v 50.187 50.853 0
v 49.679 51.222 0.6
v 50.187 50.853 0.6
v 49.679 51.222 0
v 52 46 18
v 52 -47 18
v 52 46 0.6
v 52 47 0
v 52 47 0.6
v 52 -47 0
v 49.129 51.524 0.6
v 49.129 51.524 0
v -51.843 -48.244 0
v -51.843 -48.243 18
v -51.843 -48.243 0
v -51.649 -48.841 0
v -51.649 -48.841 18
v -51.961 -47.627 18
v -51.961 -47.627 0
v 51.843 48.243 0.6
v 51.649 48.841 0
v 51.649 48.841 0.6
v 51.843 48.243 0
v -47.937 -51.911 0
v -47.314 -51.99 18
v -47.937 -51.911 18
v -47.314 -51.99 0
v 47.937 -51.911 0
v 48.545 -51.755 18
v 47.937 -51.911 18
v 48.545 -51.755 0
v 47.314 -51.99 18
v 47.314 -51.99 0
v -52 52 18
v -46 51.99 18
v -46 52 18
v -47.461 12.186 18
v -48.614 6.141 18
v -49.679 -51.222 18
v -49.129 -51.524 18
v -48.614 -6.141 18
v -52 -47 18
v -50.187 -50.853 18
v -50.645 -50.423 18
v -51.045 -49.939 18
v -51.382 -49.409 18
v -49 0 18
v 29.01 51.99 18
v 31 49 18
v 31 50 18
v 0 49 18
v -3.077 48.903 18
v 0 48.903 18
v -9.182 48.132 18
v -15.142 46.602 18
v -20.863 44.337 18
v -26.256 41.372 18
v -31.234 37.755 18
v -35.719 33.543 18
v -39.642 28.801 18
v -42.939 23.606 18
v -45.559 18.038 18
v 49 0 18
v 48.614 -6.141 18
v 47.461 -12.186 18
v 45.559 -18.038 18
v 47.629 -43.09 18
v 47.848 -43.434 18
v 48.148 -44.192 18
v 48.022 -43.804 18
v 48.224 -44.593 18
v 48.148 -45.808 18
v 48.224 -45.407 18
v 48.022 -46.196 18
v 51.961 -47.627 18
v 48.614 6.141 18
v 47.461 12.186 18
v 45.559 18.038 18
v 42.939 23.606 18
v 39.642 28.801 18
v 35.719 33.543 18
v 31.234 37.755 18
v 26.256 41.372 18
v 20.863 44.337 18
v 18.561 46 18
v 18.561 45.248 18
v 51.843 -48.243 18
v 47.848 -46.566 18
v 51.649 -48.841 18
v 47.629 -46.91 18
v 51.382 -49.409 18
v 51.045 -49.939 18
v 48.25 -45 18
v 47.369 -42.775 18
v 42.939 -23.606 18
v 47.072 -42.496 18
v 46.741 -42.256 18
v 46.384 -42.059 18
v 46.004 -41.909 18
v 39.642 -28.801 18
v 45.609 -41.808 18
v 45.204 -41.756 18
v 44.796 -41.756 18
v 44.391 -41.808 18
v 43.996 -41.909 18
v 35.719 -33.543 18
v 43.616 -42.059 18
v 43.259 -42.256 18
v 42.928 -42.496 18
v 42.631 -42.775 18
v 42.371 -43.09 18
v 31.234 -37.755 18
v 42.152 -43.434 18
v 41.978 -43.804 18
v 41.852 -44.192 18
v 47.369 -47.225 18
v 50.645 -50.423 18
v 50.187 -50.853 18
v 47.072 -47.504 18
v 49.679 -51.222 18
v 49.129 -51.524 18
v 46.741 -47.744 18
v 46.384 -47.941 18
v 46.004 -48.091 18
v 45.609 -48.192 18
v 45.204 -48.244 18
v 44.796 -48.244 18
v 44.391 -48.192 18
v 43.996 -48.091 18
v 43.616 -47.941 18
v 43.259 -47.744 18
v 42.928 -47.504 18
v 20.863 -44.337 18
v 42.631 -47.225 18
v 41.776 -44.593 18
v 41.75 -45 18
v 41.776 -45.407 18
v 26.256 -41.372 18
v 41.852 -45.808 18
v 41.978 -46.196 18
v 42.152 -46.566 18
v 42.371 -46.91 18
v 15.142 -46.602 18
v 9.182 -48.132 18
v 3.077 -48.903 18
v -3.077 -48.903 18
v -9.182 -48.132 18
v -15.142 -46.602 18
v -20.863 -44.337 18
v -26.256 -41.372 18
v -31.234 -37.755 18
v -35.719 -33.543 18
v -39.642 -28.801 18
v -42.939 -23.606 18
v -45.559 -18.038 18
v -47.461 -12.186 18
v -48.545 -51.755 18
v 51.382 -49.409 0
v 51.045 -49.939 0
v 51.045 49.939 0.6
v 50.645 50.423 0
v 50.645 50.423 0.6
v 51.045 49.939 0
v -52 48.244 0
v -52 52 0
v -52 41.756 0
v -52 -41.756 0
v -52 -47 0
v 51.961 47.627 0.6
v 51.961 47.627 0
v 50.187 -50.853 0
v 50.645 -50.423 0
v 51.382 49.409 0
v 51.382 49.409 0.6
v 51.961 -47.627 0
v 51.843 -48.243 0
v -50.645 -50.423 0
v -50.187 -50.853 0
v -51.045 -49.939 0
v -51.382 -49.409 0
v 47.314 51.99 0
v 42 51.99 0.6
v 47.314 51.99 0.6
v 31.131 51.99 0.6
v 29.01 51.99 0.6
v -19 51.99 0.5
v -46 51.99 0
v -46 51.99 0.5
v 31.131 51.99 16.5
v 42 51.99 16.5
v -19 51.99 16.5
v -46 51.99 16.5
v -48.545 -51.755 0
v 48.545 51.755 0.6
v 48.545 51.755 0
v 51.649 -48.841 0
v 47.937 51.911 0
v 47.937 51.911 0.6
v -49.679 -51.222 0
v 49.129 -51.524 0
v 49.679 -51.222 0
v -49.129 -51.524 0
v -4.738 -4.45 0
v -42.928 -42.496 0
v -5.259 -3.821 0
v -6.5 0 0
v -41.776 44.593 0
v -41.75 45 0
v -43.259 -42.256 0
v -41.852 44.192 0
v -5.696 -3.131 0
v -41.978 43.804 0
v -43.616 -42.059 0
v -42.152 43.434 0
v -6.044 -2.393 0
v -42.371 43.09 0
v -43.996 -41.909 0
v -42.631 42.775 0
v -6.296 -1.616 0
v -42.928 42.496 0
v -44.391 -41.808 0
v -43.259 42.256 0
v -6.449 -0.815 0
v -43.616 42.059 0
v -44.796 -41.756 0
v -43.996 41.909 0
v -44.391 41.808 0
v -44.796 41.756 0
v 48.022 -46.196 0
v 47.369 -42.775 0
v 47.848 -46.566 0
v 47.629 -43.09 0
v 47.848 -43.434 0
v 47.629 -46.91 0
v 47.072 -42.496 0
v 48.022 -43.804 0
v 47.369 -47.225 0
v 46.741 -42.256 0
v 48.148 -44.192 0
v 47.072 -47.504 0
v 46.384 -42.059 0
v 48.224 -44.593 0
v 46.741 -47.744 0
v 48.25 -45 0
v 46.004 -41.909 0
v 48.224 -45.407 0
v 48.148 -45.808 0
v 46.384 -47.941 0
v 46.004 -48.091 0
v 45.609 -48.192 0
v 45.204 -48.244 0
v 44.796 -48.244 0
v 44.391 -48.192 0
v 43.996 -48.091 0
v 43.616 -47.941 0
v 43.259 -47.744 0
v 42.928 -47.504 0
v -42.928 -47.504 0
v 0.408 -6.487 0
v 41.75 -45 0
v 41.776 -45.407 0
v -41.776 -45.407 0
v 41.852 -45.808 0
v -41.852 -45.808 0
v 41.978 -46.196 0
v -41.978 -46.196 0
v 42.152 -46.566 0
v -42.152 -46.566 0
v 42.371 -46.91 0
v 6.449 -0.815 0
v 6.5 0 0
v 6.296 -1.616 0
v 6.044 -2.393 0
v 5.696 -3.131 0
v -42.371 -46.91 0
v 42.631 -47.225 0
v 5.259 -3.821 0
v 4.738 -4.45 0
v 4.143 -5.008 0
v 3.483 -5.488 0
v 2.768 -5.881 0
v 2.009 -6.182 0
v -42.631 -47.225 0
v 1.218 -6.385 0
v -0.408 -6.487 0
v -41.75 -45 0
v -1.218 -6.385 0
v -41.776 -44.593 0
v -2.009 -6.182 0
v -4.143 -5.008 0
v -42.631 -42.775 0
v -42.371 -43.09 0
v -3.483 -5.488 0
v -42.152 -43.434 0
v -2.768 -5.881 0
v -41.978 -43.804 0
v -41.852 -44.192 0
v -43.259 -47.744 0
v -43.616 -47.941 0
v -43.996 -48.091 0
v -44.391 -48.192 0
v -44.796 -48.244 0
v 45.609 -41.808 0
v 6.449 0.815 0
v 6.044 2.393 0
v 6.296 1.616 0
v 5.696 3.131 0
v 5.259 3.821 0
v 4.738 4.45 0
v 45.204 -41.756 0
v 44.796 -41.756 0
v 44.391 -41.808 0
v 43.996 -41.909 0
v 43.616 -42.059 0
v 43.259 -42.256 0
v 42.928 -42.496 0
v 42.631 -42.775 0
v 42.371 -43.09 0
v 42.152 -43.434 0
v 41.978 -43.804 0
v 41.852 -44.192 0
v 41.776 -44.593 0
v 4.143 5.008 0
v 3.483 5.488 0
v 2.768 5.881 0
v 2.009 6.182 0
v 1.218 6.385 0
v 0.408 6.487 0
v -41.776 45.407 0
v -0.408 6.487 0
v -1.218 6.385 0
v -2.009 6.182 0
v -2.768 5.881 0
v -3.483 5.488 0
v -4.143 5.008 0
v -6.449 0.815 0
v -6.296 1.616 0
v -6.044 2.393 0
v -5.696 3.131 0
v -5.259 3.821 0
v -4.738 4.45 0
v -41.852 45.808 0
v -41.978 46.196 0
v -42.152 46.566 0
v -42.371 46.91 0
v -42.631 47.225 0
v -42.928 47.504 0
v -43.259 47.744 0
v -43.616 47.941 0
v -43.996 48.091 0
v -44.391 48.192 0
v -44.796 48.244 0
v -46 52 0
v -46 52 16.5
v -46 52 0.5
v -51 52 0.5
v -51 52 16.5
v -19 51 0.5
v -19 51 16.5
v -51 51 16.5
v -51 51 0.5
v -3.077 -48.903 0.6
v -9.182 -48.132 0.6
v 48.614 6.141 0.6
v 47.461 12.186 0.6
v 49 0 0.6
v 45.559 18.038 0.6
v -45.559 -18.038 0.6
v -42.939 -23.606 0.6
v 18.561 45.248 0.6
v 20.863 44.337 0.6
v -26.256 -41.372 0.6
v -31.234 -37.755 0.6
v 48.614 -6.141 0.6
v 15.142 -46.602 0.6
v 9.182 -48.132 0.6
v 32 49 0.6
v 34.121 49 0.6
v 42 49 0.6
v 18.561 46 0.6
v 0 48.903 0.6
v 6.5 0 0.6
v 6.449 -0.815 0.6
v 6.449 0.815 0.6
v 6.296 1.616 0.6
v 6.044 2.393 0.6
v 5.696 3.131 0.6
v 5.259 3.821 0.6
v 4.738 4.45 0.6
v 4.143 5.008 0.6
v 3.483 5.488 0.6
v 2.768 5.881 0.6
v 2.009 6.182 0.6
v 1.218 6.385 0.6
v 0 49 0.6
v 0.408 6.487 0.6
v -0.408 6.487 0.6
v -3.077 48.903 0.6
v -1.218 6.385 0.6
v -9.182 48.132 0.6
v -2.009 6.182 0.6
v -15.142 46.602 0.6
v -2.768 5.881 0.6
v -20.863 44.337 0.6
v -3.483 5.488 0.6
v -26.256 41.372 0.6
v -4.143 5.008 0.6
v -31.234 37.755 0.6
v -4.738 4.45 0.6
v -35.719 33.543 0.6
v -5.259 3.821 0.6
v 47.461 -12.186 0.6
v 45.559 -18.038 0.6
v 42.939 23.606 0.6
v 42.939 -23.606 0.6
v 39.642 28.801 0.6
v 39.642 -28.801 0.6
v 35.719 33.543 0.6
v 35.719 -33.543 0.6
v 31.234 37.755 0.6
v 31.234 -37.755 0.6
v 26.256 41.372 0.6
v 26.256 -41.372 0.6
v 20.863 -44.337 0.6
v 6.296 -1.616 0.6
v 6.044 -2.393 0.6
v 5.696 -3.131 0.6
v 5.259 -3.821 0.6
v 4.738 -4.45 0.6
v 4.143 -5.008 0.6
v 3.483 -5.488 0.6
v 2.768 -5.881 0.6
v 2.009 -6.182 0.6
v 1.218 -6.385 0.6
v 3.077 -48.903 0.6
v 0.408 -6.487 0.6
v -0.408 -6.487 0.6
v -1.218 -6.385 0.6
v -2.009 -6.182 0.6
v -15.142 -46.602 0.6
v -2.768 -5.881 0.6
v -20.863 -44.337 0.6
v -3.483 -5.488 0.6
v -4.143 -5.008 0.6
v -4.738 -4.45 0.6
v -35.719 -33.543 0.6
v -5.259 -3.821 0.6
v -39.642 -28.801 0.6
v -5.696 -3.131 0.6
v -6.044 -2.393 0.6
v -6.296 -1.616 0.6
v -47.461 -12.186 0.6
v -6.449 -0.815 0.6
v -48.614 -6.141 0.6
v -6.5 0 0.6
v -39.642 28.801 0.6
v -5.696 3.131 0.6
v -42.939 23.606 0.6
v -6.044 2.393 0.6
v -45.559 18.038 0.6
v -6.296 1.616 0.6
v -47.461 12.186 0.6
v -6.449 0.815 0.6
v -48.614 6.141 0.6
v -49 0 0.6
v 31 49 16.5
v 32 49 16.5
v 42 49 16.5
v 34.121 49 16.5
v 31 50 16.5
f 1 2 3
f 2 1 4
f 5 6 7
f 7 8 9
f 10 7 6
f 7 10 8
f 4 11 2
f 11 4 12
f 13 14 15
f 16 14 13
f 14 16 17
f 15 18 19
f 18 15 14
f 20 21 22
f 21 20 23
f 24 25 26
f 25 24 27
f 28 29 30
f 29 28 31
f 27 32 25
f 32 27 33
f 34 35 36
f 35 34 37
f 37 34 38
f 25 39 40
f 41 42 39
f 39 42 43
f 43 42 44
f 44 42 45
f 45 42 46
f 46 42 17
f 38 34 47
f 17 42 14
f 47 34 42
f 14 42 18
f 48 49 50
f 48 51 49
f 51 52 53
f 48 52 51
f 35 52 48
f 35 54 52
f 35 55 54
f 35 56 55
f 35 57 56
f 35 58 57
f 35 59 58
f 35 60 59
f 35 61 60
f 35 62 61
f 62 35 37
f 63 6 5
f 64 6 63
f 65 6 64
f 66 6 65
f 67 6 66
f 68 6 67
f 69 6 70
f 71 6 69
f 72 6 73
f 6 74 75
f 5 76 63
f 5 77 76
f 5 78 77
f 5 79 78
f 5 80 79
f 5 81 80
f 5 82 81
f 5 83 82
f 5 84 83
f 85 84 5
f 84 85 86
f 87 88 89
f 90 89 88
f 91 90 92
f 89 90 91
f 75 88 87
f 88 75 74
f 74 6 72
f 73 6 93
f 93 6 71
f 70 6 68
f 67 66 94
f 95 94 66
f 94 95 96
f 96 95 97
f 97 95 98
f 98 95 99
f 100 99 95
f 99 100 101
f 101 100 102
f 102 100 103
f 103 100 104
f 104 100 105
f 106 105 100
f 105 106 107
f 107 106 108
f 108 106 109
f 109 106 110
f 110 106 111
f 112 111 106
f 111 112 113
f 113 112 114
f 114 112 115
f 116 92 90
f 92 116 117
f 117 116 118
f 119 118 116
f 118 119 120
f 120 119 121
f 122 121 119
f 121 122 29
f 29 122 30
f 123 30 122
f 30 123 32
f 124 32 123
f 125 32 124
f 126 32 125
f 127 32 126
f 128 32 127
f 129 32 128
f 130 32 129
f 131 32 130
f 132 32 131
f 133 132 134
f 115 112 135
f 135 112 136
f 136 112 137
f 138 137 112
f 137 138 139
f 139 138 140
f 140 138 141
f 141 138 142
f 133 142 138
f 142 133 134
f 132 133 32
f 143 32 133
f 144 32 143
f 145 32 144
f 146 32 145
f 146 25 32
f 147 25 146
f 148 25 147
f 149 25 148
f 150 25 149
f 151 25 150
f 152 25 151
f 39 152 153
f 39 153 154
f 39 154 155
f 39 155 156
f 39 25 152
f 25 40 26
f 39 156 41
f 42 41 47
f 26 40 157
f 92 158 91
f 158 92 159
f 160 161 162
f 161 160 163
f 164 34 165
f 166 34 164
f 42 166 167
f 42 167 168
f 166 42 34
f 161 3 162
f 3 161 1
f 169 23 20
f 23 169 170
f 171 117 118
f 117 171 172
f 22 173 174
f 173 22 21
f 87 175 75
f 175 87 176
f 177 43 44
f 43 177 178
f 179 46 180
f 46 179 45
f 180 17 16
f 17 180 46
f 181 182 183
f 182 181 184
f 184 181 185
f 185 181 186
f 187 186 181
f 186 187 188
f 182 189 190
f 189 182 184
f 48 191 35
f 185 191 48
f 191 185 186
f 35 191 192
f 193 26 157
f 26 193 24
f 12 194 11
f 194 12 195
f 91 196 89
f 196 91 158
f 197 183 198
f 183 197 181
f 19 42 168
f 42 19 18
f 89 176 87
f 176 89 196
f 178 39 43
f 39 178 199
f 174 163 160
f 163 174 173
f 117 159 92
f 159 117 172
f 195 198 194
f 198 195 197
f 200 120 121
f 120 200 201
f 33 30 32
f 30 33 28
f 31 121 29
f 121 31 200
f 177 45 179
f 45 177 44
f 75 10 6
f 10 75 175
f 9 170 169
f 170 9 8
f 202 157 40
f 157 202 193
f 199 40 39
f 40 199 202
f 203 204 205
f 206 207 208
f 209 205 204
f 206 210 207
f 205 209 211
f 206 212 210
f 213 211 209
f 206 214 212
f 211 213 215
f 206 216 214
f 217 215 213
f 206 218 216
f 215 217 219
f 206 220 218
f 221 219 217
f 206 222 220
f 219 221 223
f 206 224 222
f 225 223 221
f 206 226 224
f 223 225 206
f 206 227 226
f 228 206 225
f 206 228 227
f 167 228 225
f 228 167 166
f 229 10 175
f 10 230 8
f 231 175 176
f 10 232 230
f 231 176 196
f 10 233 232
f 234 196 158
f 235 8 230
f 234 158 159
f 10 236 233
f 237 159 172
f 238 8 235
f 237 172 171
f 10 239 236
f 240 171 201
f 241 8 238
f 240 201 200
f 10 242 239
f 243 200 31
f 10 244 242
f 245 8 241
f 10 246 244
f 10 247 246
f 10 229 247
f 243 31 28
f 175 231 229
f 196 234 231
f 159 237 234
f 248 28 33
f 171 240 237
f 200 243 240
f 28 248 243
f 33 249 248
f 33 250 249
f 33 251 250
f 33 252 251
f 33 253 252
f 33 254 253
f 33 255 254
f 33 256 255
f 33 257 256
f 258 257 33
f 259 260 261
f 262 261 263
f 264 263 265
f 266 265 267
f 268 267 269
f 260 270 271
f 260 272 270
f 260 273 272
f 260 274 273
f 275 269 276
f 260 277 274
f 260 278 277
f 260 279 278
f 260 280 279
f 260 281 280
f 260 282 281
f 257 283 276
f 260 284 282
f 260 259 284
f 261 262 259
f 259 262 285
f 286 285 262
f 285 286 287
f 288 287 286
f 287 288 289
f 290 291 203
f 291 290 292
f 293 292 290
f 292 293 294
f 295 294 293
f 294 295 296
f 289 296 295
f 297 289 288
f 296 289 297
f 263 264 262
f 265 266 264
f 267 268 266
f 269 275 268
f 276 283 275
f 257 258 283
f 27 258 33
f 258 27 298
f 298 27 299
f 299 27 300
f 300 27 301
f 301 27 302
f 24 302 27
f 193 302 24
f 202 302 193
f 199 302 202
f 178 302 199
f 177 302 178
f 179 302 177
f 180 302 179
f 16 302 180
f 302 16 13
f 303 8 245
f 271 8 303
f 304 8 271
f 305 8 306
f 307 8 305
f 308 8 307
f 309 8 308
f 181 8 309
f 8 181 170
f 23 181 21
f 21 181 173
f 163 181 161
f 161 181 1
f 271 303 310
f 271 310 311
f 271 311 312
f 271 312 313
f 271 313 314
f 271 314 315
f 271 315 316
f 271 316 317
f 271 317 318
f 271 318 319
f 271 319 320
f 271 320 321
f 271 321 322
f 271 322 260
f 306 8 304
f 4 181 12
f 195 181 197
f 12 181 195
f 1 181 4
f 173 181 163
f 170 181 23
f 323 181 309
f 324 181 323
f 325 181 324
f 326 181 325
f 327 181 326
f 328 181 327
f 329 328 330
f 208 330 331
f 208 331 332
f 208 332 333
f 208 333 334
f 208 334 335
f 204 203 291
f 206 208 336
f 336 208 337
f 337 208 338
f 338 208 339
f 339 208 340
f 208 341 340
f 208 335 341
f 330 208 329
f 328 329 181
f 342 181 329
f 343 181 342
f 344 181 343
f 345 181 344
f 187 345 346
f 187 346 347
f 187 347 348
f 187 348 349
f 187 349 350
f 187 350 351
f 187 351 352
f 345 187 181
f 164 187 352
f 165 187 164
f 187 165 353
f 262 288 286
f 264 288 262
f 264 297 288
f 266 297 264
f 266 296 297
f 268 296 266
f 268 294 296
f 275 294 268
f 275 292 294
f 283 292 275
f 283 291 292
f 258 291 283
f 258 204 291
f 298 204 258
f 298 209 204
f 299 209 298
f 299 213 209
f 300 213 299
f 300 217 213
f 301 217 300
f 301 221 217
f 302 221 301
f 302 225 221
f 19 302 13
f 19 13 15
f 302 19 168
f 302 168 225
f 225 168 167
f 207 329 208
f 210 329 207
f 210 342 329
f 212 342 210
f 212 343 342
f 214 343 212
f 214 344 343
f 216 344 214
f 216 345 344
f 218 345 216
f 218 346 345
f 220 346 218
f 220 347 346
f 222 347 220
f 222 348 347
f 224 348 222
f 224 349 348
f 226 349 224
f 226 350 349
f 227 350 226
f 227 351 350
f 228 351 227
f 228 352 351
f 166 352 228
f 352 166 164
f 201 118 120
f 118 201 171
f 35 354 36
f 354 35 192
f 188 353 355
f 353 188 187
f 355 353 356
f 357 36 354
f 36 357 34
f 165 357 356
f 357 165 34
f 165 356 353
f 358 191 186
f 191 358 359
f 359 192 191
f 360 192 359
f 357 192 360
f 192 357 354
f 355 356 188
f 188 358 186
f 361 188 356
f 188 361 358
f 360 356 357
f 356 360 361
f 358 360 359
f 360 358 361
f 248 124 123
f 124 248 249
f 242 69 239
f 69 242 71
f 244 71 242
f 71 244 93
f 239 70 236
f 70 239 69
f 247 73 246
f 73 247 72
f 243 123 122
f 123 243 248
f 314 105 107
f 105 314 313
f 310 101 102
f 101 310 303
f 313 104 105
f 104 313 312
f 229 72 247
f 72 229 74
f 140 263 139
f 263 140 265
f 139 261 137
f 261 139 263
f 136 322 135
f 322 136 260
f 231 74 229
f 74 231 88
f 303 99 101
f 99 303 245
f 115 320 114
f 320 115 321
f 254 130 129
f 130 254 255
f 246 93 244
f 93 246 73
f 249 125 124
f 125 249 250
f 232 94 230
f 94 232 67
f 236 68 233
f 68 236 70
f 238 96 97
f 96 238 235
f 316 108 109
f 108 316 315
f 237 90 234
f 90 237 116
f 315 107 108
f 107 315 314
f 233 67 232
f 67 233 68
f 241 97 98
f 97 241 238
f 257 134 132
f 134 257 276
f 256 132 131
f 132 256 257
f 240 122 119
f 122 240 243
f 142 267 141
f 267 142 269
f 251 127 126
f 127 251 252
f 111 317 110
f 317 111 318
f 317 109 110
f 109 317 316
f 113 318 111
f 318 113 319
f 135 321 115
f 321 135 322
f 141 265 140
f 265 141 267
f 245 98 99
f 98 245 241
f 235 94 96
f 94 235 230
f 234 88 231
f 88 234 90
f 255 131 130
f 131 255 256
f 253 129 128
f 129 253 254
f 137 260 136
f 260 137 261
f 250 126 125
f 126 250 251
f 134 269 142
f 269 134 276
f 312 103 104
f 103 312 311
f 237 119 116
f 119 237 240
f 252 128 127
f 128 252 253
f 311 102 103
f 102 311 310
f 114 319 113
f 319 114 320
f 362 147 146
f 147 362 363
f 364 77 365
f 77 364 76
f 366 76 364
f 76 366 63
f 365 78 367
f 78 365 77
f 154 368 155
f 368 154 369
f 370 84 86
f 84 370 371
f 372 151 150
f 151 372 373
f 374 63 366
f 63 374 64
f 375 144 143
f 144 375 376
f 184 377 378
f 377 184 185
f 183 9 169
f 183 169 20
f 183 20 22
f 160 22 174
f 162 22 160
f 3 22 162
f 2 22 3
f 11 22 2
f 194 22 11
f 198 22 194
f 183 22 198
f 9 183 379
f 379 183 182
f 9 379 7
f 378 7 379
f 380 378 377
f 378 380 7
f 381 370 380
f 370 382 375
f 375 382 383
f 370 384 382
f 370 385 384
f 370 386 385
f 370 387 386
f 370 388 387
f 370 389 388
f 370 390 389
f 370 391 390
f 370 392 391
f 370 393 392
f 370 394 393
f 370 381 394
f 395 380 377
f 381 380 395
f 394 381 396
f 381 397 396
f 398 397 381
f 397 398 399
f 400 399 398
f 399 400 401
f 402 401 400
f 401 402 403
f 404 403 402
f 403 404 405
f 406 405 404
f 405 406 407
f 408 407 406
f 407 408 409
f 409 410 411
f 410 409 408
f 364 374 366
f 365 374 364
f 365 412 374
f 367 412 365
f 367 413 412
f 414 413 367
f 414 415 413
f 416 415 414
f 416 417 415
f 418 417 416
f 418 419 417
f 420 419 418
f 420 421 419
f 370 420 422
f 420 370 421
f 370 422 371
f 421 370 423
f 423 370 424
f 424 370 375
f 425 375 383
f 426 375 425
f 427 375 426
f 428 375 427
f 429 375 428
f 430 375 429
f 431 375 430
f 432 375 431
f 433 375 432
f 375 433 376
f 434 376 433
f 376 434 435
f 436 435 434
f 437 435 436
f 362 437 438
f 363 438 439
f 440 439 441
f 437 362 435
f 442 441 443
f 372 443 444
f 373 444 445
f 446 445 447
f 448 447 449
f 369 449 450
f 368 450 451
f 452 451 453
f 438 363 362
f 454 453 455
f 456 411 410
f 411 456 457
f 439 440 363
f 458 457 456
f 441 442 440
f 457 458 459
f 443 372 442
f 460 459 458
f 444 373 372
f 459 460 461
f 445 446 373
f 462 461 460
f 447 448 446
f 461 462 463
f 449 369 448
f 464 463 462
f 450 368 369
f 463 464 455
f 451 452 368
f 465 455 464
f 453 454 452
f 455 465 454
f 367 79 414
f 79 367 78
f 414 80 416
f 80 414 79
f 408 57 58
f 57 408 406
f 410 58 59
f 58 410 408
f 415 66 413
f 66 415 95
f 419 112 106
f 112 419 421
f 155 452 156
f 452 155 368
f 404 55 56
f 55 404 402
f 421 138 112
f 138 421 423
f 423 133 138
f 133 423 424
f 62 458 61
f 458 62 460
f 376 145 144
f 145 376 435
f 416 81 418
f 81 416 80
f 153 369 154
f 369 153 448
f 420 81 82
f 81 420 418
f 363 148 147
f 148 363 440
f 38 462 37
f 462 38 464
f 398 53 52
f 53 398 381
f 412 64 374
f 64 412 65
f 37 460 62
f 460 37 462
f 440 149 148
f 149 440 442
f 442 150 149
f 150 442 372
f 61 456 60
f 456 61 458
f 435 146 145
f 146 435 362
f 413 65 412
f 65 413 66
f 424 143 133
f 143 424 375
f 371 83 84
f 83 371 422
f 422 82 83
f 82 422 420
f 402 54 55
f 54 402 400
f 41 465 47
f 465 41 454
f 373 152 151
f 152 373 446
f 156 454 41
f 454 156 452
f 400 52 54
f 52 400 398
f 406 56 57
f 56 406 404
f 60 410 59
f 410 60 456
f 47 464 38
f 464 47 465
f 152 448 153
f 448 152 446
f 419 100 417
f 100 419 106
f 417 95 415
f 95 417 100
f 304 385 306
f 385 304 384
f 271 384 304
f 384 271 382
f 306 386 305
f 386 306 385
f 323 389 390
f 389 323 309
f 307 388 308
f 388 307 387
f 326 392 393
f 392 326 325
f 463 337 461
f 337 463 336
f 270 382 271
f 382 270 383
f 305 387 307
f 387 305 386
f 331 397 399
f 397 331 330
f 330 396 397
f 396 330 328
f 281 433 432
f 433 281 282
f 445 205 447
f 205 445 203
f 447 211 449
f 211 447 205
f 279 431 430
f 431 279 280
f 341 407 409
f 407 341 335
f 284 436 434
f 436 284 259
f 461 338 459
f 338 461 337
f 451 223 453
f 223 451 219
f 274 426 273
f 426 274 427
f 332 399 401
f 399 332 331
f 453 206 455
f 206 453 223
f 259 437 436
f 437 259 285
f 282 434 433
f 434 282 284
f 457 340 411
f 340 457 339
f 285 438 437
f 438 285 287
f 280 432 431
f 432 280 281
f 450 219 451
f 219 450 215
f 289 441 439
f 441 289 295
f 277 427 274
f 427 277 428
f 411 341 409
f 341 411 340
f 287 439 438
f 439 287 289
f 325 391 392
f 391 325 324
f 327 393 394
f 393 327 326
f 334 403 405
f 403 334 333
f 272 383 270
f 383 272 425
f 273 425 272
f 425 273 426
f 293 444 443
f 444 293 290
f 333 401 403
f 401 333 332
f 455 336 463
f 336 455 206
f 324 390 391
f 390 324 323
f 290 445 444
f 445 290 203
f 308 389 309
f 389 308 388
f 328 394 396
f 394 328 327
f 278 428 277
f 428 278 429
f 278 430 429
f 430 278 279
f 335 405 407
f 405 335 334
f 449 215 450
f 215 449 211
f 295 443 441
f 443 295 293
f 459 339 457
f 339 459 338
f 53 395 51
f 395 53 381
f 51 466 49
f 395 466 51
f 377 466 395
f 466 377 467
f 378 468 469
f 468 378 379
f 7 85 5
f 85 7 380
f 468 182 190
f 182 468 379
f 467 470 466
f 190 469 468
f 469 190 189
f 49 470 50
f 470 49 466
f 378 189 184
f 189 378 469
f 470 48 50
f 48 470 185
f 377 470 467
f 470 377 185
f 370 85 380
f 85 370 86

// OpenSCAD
$fn = 50;


difference() {
	union() {
		hull() {
			translate(v = [-47.0000000000, 47.0000000000, 0]) {
				cylinder(h = 18, r = 5);
			}
			translate(v = [47.0000000000, 47.0000000000, 0]) {
				cylinder(h = 18, r = 5);
			}
			translate(v = [-47.0000000000, -47.0000000000, 0]) {
				cylinder(h = 18, r = 5);
			}
			translate(v = [47.0000000000, -47.0000000000, 0]) {
				cylinder(h = 18, r = 5);
			}
		}
		translate(v = [-52.0000000000, 46.0000000000, 0]) {
			cube(size = [6, 6, 18]);
		}
	}
	union() {
		translate(v = [-52.5000000000, -45.0000000000, -250.0000000000]) {
			rotate(a = [0, 0, 0]) {
				difference() {
					union() {
						hull() {
							translate(v = [7.5000000000, 0, 0]) {
								cylinder(h = 250, r = 3.2500000000, r1 = 3.2500000000, r2 = 3.2500000000);
							}
							translate(v = [-7.5000000000, 0, 0]) {
								cylinder(h = 250, r = 3.2500000000, r1 = 3.2500000000, r2 = 3.2500000000);
							}
						}
					}
					union();
				}
			}
		}
		translate(v = [-52.5000000000, 45.0000000000, -250.0000000000]) {
			rotate(a = [0, 0, 0]) {
				difference() {
					union() {
						hull() {
							translate(v = [7.5000000000, 0, 0]) {
								cylinder(h = 250, r = 3.2500000000, r1 = 3.2500000000, r2 = 3.2500000000);
							}
							translate(v = [-7.5000000000, 0, 0]) {
								cylinder(h = 250, r = 3.2500000000, r1 = 3.2500000000, r2 = 3.2500000000);
							}
						}
					}
					union();
				}
			}
		}
		translate(v = [-51.0000000000, 51.0000000000, 0.5000000000]) {
			cube(size = [32, 1, 16]);
		}
		translate(v = [45.0000000000, -45.0000000000, -50.0000000000]) {
			cylinder(h = 100, r = 3.2500000000);
		}
		translate(v = [0, 0, 0.6000000000]) {
			cylinder(h = 20.4000000000, r = 49.0000000000);
		}
		translate(v = [0, 0, -9.0000000000]) {
			cylinder(h = 18, r = 6.5000000000);
		}
		translate(v = [0.0000000000, 46.0000000000, 0.6000000000]) {
			cube(size = [52.0000000000, 3, 20.4000000000]);
		}
		translate(v = [42.0000000000, 46.0000000000, 0.6000000000]) {
			cube(size = [10, 6, 20.4000000000]);
		}
		translate(v = [31.0000000000, 46.0000000000, 16.5000000000]) {
			cube(size = [21, 6, 1.5000000000]);
		}
		translate(v = [28.2500000000, 52.7500000000, 0.6000000000]) {
			rotate(a = [0, 0, -45]) {
				cube(size = [7.5000000000, 1.5000000000, 20.4000000000]);
			}
		}
		translate(v = [11.0610000000, 44.0000000000, 0.6000000000]) {
			cube(size = [7.5000000000, 2, 17.4000000000]);
		}
	}
}
